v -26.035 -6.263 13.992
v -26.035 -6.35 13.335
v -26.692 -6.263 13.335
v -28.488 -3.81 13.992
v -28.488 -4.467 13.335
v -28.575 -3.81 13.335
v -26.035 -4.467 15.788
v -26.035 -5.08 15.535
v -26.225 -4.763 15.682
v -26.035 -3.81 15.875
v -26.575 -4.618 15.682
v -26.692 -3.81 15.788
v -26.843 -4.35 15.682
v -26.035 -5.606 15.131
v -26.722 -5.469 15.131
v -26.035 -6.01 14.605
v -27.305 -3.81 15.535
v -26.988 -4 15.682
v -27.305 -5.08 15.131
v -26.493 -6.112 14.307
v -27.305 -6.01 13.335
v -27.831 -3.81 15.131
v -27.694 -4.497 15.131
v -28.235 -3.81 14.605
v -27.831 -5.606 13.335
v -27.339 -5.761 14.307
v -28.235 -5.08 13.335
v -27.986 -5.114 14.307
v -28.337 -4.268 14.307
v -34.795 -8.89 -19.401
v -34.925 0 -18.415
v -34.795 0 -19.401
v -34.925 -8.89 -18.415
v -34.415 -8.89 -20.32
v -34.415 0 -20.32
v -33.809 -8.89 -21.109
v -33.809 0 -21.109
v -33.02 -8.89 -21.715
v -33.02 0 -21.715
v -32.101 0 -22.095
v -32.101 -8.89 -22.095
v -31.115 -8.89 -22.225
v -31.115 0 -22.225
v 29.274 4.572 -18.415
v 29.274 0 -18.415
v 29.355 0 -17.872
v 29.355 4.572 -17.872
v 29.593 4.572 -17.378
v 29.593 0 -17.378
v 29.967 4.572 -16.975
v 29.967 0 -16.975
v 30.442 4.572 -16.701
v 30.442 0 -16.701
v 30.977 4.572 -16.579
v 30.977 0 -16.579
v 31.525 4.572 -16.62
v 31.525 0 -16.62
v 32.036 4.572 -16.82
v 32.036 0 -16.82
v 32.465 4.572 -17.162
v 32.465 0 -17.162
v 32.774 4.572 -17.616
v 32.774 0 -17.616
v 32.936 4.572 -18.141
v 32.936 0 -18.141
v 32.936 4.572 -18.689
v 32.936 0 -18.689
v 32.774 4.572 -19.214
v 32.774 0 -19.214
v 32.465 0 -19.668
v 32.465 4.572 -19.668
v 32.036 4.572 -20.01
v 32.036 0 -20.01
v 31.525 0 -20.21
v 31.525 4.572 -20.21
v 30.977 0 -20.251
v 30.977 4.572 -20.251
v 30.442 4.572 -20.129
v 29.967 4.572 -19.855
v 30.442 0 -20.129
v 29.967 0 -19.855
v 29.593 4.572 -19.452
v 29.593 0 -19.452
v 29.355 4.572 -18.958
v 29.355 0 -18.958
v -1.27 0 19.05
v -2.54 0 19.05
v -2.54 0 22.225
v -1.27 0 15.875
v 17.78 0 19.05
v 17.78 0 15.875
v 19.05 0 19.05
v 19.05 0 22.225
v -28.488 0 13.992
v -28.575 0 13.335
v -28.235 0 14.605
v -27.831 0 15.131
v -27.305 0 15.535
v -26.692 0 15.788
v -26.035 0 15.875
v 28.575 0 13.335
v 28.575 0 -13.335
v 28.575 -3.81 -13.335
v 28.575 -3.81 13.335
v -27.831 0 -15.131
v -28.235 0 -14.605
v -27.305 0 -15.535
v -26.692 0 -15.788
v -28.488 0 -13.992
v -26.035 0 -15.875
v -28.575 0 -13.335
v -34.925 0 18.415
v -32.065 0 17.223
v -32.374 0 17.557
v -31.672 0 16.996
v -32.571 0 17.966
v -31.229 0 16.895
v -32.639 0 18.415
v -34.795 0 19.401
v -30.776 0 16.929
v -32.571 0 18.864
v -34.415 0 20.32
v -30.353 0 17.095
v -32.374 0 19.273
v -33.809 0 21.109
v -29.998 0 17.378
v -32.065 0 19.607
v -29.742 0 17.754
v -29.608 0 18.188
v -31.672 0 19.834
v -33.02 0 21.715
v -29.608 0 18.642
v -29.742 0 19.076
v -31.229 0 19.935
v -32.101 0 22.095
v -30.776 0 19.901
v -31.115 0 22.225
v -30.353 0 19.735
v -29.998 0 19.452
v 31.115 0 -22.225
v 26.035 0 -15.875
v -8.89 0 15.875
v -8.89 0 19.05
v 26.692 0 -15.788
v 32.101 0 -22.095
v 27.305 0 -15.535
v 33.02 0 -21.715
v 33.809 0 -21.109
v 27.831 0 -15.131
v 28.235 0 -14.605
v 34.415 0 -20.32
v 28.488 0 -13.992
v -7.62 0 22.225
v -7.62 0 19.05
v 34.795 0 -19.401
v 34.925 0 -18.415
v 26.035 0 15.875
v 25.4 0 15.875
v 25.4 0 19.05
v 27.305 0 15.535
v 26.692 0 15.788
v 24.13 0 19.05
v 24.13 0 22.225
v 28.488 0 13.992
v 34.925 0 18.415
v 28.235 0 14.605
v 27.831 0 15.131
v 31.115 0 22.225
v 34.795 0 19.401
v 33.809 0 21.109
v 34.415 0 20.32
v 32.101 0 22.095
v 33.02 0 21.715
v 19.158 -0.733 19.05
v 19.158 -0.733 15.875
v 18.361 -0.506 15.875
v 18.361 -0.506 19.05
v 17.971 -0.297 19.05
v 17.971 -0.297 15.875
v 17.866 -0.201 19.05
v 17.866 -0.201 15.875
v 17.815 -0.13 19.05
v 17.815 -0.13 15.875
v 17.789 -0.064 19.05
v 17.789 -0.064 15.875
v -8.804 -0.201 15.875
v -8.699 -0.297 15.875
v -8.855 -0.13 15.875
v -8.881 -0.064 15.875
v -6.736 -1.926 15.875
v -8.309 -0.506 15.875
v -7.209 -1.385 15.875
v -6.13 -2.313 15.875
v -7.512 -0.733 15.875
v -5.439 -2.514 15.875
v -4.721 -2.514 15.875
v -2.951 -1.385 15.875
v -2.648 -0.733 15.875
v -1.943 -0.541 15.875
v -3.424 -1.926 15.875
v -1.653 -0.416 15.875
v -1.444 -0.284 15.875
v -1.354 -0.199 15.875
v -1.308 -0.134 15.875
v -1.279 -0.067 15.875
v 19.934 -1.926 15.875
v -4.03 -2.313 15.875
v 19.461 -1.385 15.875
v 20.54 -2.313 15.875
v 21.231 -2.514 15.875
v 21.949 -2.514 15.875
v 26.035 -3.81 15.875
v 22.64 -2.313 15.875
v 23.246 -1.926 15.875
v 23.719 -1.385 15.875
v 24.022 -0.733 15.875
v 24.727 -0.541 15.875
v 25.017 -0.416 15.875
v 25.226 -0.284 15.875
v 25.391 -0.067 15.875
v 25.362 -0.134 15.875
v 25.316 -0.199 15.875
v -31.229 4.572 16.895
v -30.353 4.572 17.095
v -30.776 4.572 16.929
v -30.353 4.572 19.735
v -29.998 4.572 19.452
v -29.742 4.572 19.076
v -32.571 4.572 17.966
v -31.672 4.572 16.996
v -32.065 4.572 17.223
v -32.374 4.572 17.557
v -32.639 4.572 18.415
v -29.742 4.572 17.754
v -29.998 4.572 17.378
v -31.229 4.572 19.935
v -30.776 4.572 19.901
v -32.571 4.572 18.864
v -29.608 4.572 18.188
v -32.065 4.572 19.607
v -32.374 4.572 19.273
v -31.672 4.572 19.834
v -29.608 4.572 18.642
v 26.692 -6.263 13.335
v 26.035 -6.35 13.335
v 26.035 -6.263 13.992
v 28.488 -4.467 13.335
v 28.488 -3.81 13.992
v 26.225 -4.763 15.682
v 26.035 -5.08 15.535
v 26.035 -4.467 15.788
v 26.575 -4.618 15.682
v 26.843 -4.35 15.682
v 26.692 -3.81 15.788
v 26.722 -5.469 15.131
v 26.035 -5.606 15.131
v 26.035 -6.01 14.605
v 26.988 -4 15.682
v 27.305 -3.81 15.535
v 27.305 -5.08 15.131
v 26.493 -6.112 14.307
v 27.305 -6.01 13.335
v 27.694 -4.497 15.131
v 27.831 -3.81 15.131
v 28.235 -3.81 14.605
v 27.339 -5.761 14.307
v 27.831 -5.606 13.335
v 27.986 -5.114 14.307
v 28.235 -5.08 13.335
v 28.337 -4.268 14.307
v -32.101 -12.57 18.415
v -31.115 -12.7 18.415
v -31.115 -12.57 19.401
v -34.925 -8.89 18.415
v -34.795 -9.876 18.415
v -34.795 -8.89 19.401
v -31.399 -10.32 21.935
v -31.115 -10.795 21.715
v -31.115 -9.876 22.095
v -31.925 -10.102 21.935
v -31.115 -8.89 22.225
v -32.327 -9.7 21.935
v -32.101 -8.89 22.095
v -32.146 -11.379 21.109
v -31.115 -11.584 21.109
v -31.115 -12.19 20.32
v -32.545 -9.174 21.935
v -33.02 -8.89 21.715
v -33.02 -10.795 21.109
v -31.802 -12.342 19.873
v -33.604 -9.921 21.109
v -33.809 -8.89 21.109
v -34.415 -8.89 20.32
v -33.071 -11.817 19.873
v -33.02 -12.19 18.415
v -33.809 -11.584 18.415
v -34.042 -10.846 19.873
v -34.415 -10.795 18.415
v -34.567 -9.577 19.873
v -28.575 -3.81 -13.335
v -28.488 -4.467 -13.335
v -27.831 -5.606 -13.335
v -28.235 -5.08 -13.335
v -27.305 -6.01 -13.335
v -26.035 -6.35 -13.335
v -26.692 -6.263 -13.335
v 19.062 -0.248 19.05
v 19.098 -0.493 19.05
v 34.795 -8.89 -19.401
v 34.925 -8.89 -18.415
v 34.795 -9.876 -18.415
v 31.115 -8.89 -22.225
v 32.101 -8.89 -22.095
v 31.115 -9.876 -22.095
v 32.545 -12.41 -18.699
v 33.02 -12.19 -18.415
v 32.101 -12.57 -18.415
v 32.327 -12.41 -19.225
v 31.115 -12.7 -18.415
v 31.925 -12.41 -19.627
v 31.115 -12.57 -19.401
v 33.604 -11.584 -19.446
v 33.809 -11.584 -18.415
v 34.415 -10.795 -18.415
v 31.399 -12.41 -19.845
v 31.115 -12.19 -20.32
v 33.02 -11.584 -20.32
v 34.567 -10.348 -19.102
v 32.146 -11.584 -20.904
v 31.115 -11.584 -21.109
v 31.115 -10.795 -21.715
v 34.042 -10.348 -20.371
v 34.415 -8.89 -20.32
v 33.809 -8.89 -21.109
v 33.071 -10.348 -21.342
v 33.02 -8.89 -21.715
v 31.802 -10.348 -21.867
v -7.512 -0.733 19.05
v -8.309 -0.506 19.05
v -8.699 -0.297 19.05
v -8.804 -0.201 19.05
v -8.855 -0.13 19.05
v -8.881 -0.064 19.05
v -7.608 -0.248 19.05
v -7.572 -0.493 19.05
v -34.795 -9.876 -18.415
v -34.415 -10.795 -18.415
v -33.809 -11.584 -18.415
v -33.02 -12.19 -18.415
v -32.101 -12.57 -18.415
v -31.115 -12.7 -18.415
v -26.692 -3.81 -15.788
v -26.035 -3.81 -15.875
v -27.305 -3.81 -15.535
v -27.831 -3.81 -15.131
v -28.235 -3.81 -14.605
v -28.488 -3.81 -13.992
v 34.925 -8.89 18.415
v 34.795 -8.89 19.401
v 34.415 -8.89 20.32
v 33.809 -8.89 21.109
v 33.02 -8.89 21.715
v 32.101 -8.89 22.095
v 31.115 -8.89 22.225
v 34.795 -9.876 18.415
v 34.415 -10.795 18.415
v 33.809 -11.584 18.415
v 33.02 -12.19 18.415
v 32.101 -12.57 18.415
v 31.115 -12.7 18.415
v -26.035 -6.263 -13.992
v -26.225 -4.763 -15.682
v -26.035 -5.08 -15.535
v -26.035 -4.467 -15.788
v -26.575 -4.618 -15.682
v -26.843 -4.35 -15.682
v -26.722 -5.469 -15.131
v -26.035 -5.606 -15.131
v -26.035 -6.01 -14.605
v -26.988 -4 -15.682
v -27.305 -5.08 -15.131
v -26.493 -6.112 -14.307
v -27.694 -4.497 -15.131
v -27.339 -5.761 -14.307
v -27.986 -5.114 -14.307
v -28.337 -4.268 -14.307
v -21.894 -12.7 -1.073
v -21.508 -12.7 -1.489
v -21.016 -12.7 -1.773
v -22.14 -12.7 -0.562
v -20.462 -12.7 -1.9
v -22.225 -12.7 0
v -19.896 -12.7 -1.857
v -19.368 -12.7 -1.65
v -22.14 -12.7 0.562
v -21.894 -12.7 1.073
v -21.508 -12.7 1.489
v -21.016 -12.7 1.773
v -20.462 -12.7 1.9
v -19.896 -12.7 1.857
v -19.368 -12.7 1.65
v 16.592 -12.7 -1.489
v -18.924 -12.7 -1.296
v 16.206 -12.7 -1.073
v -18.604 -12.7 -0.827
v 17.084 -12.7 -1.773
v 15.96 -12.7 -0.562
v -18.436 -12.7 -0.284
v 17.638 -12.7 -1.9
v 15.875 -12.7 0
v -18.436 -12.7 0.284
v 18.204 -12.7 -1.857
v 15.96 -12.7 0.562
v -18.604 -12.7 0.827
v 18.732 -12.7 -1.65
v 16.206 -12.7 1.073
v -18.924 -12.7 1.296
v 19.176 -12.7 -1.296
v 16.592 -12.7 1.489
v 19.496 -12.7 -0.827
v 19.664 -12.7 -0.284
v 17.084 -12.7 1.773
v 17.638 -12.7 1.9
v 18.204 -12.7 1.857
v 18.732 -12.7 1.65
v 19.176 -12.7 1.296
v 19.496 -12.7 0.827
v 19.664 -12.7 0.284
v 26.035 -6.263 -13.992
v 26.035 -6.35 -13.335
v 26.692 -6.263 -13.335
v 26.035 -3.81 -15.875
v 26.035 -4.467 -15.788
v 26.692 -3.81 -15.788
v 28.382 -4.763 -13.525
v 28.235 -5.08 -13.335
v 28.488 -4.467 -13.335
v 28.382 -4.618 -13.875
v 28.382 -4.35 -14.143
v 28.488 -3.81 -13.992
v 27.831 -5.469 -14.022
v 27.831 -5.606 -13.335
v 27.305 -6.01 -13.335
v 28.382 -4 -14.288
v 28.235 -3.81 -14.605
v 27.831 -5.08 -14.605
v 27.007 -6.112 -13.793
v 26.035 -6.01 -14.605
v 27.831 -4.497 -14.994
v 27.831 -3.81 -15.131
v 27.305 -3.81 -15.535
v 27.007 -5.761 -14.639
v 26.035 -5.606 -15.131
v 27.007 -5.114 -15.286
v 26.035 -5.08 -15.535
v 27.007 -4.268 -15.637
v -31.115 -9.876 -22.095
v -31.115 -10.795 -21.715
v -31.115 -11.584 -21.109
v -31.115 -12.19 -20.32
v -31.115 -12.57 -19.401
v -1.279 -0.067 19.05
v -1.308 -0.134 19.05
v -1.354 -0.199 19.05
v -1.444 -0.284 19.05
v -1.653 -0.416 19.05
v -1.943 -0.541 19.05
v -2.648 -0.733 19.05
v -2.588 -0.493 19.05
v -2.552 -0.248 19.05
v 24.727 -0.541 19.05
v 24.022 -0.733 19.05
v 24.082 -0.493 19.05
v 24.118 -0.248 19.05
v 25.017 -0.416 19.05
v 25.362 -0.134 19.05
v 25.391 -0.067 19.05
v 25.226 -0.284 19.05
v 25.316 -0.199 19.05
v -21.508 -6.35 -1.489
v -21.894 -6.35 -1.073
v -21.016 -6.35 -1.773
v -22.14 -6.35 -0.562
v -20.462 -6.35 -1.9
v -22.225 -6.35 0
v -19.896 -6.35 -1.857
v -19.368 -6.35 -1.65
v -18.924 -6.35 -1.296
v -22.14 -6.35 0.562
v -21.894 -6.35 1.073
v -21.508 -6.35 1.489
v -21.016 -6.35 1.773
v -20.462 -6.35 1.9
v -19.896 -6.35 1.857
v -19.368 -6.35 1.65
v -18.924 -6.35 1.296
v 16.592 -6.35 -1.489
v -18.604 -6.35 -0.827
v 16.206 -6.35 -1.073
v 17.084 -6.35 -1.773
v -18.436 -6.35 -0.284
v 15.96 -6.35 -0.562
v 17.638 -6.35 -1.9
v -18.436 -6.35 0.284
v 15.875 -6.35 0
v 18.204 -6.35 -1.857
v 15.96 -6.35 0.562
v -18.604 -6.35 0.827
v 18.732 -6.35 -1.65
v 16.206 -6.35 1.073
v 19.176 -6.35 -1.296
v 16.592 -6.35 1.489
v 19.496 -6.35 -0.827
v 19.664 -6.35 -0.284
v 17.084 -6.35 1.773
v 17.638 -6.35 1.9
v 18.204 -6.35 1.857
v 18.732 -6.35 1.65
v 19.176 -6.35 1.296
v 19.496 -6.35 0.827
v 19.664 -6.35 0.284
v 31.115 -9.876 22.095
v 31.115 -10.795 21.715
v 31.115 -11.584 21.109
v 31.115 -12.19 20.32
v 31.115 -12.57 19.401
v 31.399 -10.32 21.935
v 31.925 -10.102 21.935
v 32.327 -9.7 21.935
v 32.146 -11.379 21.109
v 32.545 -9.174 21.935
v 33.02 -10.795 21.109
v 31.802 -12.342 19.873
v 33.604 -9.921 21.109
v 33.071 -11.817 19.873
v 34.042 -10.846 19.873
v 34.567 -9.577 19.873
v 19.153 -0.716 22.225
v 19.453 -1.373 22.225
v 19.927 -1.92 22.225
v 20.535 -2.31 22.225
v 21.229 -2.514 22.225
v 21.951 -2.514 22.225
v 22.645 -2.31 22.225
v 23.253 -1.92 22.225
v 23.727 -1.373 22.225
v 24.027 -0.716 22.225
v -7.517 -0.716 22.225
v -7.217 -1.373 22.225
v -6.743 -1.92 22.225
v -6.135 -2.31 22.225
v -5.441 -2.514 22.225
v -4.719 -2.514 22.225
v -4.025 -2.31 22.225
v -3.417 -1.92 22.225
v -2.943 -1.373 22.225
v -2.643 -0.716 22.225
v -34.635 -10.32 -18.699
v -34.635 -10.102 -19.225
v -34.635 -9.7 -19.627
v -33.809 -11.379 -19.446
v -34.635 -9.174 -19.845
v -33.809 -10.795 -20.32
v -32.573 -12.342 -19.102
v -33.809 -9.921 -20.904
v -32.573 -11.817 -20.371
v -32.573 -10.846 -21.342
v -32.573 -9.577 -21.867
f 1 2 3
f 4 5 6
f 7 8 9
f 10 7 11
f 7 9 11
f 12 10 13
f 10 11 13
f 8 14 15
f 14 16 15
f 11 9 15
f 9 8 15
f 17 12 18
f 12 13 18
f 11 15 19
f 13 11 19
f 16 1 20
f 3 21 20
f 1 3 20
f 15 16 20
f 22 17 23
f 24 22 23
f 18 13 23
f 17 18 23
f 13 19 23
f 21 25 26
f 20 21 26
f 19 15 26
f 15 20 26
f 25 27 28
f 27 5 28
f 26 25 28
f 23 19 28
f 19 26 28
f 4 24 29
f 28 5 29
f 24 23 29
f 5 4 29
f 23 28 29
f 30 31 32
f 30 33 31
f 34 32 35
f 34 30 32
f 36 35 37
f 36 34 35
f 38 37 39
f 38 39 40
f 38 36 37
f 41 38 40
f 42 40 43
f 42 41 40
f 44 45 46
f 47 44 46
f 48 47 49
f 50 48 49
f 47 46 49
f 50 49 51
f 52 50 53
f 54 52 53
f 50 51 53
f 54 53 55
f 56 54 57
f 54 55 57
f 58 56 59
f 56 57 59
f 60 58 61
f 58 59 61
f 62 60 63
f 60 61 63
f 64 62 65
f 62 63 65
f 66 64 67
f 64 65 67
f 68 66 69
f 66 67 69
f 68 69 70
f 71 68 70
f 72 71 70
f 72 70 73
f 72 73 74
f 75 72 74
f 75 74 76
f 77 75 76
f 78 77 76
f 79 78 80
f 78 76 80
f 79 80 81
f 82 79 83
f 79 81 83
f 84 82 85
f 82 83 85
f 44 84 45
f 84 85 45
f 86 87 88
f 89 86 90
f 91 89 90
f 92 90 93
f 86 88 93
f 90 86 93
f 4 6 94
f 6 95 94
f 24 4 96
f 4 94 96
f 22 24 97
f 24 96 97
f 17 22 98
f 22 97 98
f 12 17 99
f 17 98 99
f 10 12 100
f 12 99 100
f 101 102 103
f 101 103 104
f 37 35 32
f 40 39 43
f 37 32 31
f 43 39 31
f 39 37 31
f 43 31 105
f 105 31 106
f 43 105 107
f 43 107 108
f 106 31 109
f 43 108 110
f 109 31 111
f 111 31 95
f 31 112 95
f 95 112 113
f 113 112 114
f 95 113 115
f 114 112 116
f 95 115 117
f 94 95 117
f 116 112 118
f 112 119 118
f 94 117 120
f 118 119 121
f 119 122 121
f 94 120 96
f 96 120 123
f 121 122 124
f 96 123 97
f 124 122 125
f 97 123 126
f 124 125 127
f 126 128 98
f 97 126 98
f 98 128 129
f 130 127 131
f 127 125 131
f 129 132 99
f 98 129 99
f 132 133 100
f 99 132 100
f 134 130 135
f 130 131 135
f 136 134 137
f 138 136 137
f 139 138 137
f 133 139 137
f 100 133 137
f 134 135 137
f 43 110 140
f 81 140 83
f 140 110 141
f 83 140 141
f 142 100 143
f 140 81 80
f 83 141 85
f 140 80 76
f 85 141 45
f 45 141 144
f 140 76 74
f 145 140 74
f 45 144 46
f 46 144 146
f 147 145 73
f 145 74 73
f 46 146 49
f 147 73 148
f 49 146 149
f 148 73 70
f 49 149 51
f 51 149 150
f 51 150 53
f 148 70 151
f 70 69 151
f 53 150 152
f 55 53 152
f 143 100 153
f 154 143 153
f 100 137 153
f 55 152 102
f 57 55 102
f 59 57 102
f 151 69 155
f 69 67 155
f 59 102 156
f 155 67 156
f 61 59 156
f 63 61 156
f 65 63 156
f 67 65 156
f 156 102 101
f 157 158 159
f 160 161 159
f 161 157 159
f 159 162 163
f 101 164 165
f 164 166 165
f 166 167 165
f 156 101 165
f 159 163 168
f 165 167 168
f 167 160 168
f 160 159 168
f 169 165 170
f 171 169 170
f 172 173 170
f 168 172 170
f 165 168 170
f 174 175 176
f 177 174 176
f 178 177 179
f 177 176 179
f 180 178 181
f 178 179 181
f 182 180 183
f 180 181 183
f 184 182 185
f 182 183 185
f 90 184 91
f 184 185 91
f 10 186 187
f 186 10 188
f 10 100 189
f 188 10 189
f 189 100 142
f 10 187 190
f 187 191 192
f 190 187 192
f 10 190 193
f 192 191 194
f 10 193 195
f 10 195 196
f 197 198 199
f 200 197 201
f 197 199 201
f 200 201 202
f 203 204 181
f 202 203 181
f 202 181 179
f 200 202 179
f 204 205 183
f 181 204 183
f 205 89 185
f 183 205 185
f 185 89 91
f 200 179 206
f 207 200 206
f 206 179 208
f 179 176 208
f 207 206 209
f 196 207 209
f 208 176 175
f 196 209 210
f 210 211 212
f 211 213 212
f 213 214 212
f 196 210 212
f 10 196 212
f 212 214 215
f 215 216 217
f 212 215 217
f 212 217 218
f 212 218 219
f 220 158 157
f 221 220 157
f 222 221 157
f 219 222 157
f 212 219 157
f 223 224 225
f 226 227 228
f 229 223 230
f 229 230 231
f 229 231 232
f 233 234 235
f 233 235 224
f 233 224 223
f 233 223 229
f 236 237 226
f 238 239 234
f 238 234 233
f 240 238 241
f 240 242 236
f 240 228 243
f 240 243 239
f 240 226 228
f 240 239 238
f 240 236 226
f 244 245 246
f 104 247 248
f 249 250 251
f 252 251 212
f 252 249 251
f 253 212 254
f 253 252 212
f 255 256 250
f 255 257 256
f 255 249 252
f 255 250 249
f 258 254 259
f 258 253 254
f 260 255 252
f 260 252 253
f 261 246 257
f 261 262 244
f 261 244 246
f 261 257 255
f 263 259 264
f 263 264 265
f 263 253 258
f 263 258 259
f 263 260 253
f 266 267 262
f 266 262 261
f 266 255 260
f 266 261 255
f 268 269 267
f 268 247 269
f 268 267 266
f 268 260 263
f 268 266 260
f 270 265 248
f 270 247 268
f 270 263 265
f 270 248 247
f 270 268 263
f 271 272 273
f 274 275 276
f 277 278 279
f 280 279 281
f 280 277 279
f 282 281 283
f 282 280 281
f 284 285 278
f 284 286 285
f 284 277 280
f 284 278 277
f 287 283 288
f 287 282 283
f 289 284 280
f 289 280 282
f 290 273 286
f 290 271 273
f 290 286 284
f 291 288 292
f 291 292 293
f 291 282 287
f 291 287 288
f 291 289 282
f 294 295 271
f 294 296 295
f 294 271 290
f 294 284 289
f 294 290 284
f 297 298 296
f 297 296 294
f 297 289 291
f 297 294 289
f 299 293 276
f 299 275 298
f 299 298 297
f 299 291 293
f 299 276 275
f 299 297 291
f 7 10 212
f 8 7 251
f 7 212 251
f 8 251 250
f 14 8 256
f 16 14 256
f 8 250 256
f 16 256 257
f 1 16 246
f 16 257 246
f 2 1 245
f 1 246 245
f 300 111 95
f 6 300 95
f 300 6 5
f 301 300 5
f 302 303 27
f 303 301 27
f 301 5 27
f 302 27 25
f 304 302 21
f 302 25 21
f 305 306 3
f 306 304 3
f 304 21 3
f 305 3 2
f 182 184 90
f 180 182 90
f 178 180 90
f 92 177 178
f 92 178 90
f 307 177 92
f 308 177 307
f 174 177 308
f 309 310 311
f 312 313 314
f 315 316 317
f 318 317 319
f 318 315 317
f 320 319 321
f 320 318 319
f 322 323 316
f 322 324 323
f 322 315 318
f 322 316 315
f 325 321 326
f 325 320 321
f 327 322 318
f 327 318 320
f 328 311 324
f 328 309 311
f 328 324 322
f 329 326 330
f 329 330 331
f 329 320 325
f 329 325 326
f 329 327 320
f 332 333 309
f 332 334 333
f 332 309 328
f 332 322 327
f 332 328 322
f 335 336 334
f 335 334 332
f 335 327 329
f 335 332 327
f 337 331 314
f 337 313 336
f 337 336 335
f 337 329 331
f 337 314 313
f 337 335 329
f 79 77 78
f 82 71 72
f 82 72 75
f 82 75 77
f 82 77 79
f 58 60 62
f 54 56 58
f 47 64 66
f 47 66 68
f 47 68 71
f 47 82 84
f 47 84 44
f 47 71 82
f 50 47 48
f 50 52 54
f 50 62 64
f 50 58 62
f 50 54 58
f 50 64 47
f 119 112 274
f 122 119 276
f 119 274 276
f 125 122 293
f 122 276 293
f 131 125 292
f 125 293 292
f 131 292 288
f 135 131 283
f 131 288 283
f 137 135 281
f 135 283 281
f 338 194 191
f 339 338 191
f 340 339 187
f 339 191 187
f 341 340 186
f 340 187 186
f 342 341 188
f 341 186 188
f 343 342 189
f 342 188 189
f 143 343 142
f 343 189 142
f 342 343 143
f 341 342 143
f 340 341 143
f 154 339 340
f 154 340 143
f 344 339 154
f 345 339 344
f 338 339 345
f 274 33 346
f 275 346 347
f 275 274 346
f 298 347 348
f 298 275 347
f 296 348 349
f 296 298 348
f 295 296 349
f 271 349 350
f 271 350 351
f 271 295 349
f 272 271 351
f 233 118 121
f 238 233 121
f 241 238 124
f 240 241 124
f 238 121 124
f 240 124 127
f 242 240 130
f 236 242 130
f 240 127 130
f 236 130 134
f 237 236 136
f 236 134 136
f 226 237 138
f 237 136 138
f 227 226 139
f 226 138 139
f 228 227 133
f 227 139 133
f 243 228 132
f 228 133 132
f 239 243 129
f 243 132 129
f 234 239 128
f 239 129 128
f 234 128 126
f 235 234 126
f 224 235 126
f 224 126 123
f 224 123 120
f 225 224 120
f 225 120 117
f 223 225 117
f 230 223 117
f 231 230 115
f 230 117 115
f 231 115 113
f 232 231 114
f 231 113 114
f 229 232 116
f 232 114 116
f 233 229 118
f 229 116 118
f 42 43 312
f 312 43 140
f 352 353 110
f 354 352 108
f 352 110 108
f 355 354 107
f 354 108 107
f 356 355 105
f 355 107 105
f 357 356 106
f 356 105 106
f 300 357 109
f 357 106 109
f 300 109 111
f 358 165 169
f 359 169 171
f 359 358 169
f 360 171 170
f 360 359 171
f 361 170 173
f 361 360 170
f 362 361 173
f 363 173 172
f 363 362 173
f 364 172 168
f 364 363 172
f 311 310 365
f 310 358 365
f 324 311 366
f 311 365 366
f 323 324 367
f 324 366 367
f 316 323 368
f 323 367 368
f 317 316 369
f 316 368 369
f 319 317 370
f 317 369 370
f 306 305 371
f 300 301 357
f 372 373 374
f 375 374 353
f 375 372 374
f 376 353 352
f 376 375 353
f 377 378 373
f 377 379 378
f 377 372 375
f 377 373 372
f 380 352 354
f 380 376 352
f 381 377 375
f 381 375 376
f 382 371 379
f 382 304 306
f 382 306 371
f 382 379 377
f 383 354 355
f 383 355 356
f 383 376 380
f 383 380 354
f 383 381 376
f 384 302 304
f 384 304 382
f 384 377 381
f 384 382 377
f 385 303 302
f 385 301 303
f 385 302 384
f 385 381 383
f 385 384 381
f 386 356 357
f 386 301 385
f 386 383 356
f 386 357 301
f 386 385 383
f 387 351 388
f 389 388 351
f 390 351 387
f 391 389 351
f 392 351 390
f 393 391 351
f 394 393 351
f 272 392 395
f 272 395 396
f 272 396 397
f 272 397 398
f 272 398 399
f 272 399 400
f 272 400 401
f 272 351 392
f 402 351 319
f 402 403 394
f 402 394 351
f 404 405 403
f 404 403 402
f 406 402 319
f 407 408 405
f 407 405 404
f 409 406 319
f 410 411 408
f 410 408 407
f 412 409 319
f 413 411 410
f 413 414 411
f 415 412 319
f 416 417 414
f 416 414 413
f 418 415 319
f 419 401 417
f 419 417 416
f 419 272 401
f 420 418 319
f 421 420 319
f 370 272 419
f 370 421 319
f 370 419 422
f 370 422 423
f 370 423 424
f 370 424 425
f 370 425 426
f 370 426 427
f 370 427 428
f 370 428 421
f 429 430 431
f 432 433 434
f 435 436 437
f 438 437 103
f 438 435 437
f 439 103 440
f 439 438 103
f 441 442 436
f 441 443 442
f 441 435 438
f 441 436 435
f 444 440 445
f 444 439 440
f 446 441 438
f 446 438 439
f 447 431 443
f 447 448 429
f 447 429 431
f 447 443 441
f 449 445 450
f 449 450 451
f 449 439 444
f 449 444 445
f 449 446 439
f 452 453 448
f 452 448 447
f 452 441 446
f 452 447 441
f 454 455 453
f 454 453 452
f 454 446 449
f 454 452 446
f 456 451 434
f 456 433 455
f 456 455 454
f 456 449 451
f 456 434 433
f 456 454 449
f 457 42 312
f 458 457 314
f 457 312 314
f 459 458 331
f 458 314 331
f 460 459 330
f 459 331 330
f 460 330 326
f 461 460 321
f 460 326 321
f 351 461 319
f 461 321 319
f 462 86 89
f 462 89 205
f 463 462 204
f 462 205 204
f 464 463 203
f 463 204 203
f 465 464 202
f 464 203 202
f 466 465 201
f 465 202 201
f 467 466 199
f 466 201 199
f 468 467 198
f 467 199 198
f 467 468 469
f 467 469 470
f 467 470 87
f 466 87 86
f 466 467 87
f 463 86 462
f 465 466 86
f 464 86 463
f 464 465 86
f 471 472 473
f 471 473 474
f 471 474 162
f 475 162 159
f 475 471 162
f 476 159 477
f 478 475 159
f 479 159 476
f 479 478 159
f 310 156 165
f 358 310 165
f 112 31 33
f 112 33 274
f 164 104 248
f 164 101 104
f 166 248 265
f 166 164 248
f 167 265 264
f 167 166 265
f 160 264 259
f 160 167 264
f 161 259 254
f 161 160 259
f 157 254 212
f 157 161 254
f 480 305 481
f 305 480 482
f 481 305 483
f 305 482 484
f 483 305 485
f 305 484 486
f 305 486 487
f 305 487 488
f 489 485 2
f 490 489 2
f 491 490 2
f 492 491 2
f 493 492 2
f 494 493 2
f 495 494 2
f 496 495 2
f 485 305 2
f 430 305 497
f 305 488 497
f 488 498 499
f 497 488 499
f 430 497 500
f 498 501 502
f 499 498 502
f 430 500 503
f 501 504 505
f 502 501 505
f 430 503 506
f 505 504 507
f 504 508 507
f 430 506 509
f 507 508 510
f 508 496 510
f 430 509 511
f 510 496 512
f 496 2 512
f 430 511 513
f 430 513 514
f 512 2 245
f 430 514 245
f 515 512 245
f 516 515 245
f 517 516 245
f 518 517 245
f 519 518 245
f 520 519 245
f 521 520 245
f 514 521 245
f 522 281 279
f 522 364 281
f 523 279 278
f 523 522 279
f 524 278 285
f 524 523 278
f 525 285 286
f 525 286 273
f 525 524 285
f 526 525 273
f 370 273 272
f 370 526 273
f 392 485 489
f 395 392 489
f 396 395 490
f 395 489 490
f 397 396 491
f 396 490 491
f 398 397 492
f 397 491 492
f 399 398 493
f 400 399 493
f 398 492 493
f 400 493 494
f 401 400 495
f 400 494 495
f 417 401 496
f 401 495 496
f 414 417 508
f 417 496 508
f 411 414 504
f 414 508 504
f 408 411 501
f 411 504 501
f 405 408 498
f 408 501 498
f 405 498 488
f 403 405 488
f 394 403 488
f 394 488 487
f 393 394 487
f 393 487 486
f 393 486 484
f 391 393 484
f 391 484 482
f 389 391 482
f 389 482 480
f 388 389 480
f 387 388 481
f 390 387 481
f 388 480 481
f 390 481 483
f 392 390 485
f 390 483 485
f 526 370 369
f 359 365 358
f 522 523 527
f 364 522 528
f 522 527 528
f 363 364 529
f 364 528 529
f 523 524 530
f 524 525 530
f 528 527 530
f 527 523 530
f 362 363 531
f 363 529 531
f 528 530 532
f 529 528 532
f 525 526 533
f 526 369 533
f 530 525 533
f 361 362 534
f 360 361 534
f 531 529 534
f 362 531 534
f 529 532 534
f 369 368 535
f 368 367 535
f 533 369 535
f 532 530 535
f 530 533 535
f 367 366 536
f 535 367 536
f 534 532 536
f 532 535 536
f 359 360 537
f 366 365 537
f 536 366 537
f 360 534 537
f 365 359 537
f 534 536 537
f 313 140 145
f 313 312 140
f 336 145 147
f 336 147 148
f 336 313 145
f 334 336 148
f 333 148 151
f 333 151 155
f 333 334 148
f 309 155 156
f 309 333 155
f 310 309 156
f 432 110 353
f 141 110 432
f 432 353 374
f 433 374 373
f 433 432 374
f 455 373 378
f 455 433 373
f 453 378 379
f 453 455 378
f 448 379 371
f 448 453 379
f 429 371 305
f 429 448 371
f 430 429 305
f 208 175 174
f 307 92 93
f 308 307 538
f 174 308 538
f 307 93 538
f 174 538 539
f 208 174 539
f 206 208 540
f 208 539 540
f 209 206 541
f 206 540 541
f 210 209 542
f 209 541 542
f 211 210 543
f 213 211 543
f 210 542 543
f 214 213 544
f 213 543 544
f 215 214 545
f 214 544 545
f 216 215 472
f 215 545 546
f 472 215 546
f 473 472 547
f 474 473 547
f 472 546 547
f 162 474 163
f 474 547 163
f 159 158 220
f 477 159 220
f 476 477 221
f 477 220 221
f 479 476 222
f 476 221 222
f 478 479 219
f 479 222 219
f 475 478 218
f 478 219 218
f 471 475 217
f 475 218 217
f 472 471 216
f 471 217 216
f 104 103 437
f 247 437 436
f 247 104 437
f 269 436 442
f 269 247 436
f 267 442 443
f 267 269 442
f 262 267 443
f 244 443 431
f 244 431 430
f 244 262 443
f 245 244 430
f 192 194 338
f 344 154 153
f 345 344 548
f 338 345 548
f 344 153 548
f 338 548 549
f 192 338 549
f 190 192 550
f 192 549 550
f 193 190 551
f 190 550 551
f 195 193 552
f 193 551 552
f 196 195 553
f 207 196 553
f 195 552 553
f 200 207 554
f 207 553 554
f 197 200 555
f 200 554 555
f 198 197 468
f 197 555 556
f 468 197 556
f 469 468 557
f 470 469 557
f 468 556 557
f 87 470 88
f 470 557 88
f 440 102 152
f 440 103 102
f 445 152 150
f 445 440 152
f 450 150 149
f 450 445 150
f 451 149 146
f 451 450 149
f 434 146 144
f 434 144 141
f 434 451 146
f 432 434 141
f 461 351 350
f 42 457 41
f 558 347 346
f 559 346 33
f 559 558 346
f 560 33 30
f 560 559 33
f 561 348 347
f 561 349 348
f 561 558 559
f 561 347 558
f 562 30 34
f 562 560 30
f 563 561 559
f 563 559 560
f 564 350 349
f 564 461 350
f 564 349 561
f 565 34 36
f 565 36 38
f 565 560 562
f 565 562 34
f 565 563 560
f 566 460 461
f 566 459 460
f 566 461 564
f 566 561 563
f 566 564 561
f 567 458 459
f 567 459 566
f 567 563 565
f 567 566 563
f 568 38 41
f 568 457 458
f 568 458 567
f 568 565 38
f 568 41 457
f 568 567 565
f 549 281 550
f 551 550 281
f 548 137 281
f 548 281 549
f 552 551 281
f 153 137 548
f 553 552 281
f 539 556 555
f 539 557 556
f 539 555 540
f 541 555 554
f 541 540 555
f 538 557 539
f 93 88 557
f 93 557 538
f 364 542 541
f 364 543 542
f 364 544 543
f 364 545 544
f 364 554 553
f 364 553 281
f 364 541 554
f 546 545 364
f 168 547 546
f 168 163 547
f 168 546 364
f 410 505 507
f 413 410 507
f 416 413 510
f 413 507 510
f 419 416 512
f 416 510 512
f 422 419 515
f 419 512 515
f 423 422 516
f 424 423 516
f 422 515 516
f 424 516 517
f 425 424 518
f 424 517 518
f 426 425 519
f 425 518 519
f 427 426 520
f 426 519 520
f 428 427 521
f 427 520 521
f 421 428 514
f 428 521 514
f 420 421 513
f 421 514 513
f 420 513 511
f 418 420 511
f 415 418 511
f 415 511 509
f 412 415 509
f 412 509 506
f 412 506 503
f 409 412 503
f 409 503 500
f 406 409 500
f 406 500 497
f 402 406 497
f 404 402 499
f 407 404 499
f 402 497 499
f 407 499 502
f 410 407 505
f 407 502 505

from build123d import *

# Parameters (mm, degrees)
F0_W      = 69.85
F0_H      = 44.45
F1_DEPTH  = 12.7
F2_T      = -6.35
F3_R      = 3.81
F4_R      = 2.54
F5_R      = 1.524
F5_R_2    = 1.8415
F6_DEPTH  = 4.572
F7_R      = 1.905
F8_DEPTH  = 6.35
F9_R      = 2.54
F10_DEPTH = 6.35
F12_DEPTH = 3.175


# Not quite as in the source:
# - a feature names something its author has since deleted; it is built from what else it names


with BuildPart() as f1:
    # F0 (on Front) → F1 (new body)
    with BuildSketch(Plane.XZ):
        Rectangle(F0_W, F0_H)
    extrude(amount=F1_DEPTH)

    # F2
    f2_openings = [f1.faces().sort_by_distance(p)[0] for p in [
        (0, 0, 0),
    ]]
    offset(amount=F2_T, openings=f2_openings)

    # F3
    f3_edges = [f1.edges().sort_by_distance(p)[0] for p in [
        (34.925, -6.35, -22.225),
        (34.925, -12.7, 0),
        (0, -12.7, -22.225),
        (-34.925, -12.7, 0),
        (0, -12.7, 22.225),
        (-34.925, -6.35, 22.225),
        (34.925, -6.35, 22.225),
        (-34.925, -6.35, -22.225),
    ]]
    fillet(f3_edges, radius=F3_R)

    # F4
    f4_edges = [f1.edges().sort_by_distance(p)[0] for p in [
        (-28.575, -6.35, 0),
        (0, -6.35, -15.875),
        (28.575, -6.35, 0),
        (0, -6.35, 15.875),
        (-28.575, -3.175, -15.875),
        (28.575, -3.175, -15.875),
        (28.575, -3.175, 15.875),
        (-28.575, -3.175, 15.875),
    ]]
    fillet(f4_edges, radius=F4_R)

    # F5 (on face) → F6 (join)
    with BuildSketch(Plane(origin=(0, 0, 0), x_dir=(-1, 0, 0), z_dir=(0, 1, 0))):
        with Locations((31.115, 18.415)):
            Circle(F5_R)
        with Locations((-31.115, -18.415)):
            Circle(F5_R_2)
    extrude(amount=F6_DEPTH)

    # F7 (on face) → F8 (cut, through all)
    with BuildSketch(Plane(origin=(0, -6.35, 0), x_dir=(-1, 0, 0), z_dir=(0, 1, 0))):
        with Locations((20.32, 0)):
            Circle(F7_R)
        with Locations((-17.78, 0)):
            Circle(F7_R)
    extrude(amount=-F8_DEPTH, mode=Mode.SUBTRACT)

    # F9 (on face) → F10 (cut, through all)
    with BuildSketch(Plane.XY.offset(22.225)):
        with Locations((-5.08, 0)):
            Circle(F9_R)
        with Locations((21.59, 0)):
            Circle(F9_R)
    extrude(amount=-F10_DEPTH, mode=Mode.SUBTRACT)

    # F11 (on face) → F12 (cut)
    with BuildSketch(Plane(origin=(0, 0, 15.875), x_dir=(1, 0, 0), z_dir=(0, 0, -1))):
        with BuildLine():
            add(Edge.make_bspline(
                [(-8.89, 0), (-8.89, -1.6497783942), (-3.175, -0.8248891971), (2.54, 0), (-3.175, 0.8248891971), (-8.89, 1.6497783942), (-8.89, 0)],
                knots=[0, 0, 0, 2.0943951024, 2.0943951024, 4.1887902048, 4.1887902048, 6.2831853072, 6.2831853072, 6.2831853072], degree=2, weights=[1, 0.5, 1, 0.5, 1, 0.5, 1]))
        make_face()
        with BuildLine():
            add(Edge.make_bspline(
                [(17.78, 0), (17.78, -1.6497783942), (23.495, -0.8248891971), (29.21, 0), (23.495, 0.8248891971), (17.78, 1.6497783942), (17.78, 0)],
                knots=[0, 0, 0, 2.0943951024, 2.0943951024, 4.1887902048, 4.1887902048, 6.2831853072, 6.2831853072, 6.2831853072], degree=2, weights=[1, 0.5, 1, 0.5, 1, 0.5, 1]))
        make_face()
    extrude(amount=-F12_DEPTH, mode=Mode.SUBTRACT)


solid = f1.part
